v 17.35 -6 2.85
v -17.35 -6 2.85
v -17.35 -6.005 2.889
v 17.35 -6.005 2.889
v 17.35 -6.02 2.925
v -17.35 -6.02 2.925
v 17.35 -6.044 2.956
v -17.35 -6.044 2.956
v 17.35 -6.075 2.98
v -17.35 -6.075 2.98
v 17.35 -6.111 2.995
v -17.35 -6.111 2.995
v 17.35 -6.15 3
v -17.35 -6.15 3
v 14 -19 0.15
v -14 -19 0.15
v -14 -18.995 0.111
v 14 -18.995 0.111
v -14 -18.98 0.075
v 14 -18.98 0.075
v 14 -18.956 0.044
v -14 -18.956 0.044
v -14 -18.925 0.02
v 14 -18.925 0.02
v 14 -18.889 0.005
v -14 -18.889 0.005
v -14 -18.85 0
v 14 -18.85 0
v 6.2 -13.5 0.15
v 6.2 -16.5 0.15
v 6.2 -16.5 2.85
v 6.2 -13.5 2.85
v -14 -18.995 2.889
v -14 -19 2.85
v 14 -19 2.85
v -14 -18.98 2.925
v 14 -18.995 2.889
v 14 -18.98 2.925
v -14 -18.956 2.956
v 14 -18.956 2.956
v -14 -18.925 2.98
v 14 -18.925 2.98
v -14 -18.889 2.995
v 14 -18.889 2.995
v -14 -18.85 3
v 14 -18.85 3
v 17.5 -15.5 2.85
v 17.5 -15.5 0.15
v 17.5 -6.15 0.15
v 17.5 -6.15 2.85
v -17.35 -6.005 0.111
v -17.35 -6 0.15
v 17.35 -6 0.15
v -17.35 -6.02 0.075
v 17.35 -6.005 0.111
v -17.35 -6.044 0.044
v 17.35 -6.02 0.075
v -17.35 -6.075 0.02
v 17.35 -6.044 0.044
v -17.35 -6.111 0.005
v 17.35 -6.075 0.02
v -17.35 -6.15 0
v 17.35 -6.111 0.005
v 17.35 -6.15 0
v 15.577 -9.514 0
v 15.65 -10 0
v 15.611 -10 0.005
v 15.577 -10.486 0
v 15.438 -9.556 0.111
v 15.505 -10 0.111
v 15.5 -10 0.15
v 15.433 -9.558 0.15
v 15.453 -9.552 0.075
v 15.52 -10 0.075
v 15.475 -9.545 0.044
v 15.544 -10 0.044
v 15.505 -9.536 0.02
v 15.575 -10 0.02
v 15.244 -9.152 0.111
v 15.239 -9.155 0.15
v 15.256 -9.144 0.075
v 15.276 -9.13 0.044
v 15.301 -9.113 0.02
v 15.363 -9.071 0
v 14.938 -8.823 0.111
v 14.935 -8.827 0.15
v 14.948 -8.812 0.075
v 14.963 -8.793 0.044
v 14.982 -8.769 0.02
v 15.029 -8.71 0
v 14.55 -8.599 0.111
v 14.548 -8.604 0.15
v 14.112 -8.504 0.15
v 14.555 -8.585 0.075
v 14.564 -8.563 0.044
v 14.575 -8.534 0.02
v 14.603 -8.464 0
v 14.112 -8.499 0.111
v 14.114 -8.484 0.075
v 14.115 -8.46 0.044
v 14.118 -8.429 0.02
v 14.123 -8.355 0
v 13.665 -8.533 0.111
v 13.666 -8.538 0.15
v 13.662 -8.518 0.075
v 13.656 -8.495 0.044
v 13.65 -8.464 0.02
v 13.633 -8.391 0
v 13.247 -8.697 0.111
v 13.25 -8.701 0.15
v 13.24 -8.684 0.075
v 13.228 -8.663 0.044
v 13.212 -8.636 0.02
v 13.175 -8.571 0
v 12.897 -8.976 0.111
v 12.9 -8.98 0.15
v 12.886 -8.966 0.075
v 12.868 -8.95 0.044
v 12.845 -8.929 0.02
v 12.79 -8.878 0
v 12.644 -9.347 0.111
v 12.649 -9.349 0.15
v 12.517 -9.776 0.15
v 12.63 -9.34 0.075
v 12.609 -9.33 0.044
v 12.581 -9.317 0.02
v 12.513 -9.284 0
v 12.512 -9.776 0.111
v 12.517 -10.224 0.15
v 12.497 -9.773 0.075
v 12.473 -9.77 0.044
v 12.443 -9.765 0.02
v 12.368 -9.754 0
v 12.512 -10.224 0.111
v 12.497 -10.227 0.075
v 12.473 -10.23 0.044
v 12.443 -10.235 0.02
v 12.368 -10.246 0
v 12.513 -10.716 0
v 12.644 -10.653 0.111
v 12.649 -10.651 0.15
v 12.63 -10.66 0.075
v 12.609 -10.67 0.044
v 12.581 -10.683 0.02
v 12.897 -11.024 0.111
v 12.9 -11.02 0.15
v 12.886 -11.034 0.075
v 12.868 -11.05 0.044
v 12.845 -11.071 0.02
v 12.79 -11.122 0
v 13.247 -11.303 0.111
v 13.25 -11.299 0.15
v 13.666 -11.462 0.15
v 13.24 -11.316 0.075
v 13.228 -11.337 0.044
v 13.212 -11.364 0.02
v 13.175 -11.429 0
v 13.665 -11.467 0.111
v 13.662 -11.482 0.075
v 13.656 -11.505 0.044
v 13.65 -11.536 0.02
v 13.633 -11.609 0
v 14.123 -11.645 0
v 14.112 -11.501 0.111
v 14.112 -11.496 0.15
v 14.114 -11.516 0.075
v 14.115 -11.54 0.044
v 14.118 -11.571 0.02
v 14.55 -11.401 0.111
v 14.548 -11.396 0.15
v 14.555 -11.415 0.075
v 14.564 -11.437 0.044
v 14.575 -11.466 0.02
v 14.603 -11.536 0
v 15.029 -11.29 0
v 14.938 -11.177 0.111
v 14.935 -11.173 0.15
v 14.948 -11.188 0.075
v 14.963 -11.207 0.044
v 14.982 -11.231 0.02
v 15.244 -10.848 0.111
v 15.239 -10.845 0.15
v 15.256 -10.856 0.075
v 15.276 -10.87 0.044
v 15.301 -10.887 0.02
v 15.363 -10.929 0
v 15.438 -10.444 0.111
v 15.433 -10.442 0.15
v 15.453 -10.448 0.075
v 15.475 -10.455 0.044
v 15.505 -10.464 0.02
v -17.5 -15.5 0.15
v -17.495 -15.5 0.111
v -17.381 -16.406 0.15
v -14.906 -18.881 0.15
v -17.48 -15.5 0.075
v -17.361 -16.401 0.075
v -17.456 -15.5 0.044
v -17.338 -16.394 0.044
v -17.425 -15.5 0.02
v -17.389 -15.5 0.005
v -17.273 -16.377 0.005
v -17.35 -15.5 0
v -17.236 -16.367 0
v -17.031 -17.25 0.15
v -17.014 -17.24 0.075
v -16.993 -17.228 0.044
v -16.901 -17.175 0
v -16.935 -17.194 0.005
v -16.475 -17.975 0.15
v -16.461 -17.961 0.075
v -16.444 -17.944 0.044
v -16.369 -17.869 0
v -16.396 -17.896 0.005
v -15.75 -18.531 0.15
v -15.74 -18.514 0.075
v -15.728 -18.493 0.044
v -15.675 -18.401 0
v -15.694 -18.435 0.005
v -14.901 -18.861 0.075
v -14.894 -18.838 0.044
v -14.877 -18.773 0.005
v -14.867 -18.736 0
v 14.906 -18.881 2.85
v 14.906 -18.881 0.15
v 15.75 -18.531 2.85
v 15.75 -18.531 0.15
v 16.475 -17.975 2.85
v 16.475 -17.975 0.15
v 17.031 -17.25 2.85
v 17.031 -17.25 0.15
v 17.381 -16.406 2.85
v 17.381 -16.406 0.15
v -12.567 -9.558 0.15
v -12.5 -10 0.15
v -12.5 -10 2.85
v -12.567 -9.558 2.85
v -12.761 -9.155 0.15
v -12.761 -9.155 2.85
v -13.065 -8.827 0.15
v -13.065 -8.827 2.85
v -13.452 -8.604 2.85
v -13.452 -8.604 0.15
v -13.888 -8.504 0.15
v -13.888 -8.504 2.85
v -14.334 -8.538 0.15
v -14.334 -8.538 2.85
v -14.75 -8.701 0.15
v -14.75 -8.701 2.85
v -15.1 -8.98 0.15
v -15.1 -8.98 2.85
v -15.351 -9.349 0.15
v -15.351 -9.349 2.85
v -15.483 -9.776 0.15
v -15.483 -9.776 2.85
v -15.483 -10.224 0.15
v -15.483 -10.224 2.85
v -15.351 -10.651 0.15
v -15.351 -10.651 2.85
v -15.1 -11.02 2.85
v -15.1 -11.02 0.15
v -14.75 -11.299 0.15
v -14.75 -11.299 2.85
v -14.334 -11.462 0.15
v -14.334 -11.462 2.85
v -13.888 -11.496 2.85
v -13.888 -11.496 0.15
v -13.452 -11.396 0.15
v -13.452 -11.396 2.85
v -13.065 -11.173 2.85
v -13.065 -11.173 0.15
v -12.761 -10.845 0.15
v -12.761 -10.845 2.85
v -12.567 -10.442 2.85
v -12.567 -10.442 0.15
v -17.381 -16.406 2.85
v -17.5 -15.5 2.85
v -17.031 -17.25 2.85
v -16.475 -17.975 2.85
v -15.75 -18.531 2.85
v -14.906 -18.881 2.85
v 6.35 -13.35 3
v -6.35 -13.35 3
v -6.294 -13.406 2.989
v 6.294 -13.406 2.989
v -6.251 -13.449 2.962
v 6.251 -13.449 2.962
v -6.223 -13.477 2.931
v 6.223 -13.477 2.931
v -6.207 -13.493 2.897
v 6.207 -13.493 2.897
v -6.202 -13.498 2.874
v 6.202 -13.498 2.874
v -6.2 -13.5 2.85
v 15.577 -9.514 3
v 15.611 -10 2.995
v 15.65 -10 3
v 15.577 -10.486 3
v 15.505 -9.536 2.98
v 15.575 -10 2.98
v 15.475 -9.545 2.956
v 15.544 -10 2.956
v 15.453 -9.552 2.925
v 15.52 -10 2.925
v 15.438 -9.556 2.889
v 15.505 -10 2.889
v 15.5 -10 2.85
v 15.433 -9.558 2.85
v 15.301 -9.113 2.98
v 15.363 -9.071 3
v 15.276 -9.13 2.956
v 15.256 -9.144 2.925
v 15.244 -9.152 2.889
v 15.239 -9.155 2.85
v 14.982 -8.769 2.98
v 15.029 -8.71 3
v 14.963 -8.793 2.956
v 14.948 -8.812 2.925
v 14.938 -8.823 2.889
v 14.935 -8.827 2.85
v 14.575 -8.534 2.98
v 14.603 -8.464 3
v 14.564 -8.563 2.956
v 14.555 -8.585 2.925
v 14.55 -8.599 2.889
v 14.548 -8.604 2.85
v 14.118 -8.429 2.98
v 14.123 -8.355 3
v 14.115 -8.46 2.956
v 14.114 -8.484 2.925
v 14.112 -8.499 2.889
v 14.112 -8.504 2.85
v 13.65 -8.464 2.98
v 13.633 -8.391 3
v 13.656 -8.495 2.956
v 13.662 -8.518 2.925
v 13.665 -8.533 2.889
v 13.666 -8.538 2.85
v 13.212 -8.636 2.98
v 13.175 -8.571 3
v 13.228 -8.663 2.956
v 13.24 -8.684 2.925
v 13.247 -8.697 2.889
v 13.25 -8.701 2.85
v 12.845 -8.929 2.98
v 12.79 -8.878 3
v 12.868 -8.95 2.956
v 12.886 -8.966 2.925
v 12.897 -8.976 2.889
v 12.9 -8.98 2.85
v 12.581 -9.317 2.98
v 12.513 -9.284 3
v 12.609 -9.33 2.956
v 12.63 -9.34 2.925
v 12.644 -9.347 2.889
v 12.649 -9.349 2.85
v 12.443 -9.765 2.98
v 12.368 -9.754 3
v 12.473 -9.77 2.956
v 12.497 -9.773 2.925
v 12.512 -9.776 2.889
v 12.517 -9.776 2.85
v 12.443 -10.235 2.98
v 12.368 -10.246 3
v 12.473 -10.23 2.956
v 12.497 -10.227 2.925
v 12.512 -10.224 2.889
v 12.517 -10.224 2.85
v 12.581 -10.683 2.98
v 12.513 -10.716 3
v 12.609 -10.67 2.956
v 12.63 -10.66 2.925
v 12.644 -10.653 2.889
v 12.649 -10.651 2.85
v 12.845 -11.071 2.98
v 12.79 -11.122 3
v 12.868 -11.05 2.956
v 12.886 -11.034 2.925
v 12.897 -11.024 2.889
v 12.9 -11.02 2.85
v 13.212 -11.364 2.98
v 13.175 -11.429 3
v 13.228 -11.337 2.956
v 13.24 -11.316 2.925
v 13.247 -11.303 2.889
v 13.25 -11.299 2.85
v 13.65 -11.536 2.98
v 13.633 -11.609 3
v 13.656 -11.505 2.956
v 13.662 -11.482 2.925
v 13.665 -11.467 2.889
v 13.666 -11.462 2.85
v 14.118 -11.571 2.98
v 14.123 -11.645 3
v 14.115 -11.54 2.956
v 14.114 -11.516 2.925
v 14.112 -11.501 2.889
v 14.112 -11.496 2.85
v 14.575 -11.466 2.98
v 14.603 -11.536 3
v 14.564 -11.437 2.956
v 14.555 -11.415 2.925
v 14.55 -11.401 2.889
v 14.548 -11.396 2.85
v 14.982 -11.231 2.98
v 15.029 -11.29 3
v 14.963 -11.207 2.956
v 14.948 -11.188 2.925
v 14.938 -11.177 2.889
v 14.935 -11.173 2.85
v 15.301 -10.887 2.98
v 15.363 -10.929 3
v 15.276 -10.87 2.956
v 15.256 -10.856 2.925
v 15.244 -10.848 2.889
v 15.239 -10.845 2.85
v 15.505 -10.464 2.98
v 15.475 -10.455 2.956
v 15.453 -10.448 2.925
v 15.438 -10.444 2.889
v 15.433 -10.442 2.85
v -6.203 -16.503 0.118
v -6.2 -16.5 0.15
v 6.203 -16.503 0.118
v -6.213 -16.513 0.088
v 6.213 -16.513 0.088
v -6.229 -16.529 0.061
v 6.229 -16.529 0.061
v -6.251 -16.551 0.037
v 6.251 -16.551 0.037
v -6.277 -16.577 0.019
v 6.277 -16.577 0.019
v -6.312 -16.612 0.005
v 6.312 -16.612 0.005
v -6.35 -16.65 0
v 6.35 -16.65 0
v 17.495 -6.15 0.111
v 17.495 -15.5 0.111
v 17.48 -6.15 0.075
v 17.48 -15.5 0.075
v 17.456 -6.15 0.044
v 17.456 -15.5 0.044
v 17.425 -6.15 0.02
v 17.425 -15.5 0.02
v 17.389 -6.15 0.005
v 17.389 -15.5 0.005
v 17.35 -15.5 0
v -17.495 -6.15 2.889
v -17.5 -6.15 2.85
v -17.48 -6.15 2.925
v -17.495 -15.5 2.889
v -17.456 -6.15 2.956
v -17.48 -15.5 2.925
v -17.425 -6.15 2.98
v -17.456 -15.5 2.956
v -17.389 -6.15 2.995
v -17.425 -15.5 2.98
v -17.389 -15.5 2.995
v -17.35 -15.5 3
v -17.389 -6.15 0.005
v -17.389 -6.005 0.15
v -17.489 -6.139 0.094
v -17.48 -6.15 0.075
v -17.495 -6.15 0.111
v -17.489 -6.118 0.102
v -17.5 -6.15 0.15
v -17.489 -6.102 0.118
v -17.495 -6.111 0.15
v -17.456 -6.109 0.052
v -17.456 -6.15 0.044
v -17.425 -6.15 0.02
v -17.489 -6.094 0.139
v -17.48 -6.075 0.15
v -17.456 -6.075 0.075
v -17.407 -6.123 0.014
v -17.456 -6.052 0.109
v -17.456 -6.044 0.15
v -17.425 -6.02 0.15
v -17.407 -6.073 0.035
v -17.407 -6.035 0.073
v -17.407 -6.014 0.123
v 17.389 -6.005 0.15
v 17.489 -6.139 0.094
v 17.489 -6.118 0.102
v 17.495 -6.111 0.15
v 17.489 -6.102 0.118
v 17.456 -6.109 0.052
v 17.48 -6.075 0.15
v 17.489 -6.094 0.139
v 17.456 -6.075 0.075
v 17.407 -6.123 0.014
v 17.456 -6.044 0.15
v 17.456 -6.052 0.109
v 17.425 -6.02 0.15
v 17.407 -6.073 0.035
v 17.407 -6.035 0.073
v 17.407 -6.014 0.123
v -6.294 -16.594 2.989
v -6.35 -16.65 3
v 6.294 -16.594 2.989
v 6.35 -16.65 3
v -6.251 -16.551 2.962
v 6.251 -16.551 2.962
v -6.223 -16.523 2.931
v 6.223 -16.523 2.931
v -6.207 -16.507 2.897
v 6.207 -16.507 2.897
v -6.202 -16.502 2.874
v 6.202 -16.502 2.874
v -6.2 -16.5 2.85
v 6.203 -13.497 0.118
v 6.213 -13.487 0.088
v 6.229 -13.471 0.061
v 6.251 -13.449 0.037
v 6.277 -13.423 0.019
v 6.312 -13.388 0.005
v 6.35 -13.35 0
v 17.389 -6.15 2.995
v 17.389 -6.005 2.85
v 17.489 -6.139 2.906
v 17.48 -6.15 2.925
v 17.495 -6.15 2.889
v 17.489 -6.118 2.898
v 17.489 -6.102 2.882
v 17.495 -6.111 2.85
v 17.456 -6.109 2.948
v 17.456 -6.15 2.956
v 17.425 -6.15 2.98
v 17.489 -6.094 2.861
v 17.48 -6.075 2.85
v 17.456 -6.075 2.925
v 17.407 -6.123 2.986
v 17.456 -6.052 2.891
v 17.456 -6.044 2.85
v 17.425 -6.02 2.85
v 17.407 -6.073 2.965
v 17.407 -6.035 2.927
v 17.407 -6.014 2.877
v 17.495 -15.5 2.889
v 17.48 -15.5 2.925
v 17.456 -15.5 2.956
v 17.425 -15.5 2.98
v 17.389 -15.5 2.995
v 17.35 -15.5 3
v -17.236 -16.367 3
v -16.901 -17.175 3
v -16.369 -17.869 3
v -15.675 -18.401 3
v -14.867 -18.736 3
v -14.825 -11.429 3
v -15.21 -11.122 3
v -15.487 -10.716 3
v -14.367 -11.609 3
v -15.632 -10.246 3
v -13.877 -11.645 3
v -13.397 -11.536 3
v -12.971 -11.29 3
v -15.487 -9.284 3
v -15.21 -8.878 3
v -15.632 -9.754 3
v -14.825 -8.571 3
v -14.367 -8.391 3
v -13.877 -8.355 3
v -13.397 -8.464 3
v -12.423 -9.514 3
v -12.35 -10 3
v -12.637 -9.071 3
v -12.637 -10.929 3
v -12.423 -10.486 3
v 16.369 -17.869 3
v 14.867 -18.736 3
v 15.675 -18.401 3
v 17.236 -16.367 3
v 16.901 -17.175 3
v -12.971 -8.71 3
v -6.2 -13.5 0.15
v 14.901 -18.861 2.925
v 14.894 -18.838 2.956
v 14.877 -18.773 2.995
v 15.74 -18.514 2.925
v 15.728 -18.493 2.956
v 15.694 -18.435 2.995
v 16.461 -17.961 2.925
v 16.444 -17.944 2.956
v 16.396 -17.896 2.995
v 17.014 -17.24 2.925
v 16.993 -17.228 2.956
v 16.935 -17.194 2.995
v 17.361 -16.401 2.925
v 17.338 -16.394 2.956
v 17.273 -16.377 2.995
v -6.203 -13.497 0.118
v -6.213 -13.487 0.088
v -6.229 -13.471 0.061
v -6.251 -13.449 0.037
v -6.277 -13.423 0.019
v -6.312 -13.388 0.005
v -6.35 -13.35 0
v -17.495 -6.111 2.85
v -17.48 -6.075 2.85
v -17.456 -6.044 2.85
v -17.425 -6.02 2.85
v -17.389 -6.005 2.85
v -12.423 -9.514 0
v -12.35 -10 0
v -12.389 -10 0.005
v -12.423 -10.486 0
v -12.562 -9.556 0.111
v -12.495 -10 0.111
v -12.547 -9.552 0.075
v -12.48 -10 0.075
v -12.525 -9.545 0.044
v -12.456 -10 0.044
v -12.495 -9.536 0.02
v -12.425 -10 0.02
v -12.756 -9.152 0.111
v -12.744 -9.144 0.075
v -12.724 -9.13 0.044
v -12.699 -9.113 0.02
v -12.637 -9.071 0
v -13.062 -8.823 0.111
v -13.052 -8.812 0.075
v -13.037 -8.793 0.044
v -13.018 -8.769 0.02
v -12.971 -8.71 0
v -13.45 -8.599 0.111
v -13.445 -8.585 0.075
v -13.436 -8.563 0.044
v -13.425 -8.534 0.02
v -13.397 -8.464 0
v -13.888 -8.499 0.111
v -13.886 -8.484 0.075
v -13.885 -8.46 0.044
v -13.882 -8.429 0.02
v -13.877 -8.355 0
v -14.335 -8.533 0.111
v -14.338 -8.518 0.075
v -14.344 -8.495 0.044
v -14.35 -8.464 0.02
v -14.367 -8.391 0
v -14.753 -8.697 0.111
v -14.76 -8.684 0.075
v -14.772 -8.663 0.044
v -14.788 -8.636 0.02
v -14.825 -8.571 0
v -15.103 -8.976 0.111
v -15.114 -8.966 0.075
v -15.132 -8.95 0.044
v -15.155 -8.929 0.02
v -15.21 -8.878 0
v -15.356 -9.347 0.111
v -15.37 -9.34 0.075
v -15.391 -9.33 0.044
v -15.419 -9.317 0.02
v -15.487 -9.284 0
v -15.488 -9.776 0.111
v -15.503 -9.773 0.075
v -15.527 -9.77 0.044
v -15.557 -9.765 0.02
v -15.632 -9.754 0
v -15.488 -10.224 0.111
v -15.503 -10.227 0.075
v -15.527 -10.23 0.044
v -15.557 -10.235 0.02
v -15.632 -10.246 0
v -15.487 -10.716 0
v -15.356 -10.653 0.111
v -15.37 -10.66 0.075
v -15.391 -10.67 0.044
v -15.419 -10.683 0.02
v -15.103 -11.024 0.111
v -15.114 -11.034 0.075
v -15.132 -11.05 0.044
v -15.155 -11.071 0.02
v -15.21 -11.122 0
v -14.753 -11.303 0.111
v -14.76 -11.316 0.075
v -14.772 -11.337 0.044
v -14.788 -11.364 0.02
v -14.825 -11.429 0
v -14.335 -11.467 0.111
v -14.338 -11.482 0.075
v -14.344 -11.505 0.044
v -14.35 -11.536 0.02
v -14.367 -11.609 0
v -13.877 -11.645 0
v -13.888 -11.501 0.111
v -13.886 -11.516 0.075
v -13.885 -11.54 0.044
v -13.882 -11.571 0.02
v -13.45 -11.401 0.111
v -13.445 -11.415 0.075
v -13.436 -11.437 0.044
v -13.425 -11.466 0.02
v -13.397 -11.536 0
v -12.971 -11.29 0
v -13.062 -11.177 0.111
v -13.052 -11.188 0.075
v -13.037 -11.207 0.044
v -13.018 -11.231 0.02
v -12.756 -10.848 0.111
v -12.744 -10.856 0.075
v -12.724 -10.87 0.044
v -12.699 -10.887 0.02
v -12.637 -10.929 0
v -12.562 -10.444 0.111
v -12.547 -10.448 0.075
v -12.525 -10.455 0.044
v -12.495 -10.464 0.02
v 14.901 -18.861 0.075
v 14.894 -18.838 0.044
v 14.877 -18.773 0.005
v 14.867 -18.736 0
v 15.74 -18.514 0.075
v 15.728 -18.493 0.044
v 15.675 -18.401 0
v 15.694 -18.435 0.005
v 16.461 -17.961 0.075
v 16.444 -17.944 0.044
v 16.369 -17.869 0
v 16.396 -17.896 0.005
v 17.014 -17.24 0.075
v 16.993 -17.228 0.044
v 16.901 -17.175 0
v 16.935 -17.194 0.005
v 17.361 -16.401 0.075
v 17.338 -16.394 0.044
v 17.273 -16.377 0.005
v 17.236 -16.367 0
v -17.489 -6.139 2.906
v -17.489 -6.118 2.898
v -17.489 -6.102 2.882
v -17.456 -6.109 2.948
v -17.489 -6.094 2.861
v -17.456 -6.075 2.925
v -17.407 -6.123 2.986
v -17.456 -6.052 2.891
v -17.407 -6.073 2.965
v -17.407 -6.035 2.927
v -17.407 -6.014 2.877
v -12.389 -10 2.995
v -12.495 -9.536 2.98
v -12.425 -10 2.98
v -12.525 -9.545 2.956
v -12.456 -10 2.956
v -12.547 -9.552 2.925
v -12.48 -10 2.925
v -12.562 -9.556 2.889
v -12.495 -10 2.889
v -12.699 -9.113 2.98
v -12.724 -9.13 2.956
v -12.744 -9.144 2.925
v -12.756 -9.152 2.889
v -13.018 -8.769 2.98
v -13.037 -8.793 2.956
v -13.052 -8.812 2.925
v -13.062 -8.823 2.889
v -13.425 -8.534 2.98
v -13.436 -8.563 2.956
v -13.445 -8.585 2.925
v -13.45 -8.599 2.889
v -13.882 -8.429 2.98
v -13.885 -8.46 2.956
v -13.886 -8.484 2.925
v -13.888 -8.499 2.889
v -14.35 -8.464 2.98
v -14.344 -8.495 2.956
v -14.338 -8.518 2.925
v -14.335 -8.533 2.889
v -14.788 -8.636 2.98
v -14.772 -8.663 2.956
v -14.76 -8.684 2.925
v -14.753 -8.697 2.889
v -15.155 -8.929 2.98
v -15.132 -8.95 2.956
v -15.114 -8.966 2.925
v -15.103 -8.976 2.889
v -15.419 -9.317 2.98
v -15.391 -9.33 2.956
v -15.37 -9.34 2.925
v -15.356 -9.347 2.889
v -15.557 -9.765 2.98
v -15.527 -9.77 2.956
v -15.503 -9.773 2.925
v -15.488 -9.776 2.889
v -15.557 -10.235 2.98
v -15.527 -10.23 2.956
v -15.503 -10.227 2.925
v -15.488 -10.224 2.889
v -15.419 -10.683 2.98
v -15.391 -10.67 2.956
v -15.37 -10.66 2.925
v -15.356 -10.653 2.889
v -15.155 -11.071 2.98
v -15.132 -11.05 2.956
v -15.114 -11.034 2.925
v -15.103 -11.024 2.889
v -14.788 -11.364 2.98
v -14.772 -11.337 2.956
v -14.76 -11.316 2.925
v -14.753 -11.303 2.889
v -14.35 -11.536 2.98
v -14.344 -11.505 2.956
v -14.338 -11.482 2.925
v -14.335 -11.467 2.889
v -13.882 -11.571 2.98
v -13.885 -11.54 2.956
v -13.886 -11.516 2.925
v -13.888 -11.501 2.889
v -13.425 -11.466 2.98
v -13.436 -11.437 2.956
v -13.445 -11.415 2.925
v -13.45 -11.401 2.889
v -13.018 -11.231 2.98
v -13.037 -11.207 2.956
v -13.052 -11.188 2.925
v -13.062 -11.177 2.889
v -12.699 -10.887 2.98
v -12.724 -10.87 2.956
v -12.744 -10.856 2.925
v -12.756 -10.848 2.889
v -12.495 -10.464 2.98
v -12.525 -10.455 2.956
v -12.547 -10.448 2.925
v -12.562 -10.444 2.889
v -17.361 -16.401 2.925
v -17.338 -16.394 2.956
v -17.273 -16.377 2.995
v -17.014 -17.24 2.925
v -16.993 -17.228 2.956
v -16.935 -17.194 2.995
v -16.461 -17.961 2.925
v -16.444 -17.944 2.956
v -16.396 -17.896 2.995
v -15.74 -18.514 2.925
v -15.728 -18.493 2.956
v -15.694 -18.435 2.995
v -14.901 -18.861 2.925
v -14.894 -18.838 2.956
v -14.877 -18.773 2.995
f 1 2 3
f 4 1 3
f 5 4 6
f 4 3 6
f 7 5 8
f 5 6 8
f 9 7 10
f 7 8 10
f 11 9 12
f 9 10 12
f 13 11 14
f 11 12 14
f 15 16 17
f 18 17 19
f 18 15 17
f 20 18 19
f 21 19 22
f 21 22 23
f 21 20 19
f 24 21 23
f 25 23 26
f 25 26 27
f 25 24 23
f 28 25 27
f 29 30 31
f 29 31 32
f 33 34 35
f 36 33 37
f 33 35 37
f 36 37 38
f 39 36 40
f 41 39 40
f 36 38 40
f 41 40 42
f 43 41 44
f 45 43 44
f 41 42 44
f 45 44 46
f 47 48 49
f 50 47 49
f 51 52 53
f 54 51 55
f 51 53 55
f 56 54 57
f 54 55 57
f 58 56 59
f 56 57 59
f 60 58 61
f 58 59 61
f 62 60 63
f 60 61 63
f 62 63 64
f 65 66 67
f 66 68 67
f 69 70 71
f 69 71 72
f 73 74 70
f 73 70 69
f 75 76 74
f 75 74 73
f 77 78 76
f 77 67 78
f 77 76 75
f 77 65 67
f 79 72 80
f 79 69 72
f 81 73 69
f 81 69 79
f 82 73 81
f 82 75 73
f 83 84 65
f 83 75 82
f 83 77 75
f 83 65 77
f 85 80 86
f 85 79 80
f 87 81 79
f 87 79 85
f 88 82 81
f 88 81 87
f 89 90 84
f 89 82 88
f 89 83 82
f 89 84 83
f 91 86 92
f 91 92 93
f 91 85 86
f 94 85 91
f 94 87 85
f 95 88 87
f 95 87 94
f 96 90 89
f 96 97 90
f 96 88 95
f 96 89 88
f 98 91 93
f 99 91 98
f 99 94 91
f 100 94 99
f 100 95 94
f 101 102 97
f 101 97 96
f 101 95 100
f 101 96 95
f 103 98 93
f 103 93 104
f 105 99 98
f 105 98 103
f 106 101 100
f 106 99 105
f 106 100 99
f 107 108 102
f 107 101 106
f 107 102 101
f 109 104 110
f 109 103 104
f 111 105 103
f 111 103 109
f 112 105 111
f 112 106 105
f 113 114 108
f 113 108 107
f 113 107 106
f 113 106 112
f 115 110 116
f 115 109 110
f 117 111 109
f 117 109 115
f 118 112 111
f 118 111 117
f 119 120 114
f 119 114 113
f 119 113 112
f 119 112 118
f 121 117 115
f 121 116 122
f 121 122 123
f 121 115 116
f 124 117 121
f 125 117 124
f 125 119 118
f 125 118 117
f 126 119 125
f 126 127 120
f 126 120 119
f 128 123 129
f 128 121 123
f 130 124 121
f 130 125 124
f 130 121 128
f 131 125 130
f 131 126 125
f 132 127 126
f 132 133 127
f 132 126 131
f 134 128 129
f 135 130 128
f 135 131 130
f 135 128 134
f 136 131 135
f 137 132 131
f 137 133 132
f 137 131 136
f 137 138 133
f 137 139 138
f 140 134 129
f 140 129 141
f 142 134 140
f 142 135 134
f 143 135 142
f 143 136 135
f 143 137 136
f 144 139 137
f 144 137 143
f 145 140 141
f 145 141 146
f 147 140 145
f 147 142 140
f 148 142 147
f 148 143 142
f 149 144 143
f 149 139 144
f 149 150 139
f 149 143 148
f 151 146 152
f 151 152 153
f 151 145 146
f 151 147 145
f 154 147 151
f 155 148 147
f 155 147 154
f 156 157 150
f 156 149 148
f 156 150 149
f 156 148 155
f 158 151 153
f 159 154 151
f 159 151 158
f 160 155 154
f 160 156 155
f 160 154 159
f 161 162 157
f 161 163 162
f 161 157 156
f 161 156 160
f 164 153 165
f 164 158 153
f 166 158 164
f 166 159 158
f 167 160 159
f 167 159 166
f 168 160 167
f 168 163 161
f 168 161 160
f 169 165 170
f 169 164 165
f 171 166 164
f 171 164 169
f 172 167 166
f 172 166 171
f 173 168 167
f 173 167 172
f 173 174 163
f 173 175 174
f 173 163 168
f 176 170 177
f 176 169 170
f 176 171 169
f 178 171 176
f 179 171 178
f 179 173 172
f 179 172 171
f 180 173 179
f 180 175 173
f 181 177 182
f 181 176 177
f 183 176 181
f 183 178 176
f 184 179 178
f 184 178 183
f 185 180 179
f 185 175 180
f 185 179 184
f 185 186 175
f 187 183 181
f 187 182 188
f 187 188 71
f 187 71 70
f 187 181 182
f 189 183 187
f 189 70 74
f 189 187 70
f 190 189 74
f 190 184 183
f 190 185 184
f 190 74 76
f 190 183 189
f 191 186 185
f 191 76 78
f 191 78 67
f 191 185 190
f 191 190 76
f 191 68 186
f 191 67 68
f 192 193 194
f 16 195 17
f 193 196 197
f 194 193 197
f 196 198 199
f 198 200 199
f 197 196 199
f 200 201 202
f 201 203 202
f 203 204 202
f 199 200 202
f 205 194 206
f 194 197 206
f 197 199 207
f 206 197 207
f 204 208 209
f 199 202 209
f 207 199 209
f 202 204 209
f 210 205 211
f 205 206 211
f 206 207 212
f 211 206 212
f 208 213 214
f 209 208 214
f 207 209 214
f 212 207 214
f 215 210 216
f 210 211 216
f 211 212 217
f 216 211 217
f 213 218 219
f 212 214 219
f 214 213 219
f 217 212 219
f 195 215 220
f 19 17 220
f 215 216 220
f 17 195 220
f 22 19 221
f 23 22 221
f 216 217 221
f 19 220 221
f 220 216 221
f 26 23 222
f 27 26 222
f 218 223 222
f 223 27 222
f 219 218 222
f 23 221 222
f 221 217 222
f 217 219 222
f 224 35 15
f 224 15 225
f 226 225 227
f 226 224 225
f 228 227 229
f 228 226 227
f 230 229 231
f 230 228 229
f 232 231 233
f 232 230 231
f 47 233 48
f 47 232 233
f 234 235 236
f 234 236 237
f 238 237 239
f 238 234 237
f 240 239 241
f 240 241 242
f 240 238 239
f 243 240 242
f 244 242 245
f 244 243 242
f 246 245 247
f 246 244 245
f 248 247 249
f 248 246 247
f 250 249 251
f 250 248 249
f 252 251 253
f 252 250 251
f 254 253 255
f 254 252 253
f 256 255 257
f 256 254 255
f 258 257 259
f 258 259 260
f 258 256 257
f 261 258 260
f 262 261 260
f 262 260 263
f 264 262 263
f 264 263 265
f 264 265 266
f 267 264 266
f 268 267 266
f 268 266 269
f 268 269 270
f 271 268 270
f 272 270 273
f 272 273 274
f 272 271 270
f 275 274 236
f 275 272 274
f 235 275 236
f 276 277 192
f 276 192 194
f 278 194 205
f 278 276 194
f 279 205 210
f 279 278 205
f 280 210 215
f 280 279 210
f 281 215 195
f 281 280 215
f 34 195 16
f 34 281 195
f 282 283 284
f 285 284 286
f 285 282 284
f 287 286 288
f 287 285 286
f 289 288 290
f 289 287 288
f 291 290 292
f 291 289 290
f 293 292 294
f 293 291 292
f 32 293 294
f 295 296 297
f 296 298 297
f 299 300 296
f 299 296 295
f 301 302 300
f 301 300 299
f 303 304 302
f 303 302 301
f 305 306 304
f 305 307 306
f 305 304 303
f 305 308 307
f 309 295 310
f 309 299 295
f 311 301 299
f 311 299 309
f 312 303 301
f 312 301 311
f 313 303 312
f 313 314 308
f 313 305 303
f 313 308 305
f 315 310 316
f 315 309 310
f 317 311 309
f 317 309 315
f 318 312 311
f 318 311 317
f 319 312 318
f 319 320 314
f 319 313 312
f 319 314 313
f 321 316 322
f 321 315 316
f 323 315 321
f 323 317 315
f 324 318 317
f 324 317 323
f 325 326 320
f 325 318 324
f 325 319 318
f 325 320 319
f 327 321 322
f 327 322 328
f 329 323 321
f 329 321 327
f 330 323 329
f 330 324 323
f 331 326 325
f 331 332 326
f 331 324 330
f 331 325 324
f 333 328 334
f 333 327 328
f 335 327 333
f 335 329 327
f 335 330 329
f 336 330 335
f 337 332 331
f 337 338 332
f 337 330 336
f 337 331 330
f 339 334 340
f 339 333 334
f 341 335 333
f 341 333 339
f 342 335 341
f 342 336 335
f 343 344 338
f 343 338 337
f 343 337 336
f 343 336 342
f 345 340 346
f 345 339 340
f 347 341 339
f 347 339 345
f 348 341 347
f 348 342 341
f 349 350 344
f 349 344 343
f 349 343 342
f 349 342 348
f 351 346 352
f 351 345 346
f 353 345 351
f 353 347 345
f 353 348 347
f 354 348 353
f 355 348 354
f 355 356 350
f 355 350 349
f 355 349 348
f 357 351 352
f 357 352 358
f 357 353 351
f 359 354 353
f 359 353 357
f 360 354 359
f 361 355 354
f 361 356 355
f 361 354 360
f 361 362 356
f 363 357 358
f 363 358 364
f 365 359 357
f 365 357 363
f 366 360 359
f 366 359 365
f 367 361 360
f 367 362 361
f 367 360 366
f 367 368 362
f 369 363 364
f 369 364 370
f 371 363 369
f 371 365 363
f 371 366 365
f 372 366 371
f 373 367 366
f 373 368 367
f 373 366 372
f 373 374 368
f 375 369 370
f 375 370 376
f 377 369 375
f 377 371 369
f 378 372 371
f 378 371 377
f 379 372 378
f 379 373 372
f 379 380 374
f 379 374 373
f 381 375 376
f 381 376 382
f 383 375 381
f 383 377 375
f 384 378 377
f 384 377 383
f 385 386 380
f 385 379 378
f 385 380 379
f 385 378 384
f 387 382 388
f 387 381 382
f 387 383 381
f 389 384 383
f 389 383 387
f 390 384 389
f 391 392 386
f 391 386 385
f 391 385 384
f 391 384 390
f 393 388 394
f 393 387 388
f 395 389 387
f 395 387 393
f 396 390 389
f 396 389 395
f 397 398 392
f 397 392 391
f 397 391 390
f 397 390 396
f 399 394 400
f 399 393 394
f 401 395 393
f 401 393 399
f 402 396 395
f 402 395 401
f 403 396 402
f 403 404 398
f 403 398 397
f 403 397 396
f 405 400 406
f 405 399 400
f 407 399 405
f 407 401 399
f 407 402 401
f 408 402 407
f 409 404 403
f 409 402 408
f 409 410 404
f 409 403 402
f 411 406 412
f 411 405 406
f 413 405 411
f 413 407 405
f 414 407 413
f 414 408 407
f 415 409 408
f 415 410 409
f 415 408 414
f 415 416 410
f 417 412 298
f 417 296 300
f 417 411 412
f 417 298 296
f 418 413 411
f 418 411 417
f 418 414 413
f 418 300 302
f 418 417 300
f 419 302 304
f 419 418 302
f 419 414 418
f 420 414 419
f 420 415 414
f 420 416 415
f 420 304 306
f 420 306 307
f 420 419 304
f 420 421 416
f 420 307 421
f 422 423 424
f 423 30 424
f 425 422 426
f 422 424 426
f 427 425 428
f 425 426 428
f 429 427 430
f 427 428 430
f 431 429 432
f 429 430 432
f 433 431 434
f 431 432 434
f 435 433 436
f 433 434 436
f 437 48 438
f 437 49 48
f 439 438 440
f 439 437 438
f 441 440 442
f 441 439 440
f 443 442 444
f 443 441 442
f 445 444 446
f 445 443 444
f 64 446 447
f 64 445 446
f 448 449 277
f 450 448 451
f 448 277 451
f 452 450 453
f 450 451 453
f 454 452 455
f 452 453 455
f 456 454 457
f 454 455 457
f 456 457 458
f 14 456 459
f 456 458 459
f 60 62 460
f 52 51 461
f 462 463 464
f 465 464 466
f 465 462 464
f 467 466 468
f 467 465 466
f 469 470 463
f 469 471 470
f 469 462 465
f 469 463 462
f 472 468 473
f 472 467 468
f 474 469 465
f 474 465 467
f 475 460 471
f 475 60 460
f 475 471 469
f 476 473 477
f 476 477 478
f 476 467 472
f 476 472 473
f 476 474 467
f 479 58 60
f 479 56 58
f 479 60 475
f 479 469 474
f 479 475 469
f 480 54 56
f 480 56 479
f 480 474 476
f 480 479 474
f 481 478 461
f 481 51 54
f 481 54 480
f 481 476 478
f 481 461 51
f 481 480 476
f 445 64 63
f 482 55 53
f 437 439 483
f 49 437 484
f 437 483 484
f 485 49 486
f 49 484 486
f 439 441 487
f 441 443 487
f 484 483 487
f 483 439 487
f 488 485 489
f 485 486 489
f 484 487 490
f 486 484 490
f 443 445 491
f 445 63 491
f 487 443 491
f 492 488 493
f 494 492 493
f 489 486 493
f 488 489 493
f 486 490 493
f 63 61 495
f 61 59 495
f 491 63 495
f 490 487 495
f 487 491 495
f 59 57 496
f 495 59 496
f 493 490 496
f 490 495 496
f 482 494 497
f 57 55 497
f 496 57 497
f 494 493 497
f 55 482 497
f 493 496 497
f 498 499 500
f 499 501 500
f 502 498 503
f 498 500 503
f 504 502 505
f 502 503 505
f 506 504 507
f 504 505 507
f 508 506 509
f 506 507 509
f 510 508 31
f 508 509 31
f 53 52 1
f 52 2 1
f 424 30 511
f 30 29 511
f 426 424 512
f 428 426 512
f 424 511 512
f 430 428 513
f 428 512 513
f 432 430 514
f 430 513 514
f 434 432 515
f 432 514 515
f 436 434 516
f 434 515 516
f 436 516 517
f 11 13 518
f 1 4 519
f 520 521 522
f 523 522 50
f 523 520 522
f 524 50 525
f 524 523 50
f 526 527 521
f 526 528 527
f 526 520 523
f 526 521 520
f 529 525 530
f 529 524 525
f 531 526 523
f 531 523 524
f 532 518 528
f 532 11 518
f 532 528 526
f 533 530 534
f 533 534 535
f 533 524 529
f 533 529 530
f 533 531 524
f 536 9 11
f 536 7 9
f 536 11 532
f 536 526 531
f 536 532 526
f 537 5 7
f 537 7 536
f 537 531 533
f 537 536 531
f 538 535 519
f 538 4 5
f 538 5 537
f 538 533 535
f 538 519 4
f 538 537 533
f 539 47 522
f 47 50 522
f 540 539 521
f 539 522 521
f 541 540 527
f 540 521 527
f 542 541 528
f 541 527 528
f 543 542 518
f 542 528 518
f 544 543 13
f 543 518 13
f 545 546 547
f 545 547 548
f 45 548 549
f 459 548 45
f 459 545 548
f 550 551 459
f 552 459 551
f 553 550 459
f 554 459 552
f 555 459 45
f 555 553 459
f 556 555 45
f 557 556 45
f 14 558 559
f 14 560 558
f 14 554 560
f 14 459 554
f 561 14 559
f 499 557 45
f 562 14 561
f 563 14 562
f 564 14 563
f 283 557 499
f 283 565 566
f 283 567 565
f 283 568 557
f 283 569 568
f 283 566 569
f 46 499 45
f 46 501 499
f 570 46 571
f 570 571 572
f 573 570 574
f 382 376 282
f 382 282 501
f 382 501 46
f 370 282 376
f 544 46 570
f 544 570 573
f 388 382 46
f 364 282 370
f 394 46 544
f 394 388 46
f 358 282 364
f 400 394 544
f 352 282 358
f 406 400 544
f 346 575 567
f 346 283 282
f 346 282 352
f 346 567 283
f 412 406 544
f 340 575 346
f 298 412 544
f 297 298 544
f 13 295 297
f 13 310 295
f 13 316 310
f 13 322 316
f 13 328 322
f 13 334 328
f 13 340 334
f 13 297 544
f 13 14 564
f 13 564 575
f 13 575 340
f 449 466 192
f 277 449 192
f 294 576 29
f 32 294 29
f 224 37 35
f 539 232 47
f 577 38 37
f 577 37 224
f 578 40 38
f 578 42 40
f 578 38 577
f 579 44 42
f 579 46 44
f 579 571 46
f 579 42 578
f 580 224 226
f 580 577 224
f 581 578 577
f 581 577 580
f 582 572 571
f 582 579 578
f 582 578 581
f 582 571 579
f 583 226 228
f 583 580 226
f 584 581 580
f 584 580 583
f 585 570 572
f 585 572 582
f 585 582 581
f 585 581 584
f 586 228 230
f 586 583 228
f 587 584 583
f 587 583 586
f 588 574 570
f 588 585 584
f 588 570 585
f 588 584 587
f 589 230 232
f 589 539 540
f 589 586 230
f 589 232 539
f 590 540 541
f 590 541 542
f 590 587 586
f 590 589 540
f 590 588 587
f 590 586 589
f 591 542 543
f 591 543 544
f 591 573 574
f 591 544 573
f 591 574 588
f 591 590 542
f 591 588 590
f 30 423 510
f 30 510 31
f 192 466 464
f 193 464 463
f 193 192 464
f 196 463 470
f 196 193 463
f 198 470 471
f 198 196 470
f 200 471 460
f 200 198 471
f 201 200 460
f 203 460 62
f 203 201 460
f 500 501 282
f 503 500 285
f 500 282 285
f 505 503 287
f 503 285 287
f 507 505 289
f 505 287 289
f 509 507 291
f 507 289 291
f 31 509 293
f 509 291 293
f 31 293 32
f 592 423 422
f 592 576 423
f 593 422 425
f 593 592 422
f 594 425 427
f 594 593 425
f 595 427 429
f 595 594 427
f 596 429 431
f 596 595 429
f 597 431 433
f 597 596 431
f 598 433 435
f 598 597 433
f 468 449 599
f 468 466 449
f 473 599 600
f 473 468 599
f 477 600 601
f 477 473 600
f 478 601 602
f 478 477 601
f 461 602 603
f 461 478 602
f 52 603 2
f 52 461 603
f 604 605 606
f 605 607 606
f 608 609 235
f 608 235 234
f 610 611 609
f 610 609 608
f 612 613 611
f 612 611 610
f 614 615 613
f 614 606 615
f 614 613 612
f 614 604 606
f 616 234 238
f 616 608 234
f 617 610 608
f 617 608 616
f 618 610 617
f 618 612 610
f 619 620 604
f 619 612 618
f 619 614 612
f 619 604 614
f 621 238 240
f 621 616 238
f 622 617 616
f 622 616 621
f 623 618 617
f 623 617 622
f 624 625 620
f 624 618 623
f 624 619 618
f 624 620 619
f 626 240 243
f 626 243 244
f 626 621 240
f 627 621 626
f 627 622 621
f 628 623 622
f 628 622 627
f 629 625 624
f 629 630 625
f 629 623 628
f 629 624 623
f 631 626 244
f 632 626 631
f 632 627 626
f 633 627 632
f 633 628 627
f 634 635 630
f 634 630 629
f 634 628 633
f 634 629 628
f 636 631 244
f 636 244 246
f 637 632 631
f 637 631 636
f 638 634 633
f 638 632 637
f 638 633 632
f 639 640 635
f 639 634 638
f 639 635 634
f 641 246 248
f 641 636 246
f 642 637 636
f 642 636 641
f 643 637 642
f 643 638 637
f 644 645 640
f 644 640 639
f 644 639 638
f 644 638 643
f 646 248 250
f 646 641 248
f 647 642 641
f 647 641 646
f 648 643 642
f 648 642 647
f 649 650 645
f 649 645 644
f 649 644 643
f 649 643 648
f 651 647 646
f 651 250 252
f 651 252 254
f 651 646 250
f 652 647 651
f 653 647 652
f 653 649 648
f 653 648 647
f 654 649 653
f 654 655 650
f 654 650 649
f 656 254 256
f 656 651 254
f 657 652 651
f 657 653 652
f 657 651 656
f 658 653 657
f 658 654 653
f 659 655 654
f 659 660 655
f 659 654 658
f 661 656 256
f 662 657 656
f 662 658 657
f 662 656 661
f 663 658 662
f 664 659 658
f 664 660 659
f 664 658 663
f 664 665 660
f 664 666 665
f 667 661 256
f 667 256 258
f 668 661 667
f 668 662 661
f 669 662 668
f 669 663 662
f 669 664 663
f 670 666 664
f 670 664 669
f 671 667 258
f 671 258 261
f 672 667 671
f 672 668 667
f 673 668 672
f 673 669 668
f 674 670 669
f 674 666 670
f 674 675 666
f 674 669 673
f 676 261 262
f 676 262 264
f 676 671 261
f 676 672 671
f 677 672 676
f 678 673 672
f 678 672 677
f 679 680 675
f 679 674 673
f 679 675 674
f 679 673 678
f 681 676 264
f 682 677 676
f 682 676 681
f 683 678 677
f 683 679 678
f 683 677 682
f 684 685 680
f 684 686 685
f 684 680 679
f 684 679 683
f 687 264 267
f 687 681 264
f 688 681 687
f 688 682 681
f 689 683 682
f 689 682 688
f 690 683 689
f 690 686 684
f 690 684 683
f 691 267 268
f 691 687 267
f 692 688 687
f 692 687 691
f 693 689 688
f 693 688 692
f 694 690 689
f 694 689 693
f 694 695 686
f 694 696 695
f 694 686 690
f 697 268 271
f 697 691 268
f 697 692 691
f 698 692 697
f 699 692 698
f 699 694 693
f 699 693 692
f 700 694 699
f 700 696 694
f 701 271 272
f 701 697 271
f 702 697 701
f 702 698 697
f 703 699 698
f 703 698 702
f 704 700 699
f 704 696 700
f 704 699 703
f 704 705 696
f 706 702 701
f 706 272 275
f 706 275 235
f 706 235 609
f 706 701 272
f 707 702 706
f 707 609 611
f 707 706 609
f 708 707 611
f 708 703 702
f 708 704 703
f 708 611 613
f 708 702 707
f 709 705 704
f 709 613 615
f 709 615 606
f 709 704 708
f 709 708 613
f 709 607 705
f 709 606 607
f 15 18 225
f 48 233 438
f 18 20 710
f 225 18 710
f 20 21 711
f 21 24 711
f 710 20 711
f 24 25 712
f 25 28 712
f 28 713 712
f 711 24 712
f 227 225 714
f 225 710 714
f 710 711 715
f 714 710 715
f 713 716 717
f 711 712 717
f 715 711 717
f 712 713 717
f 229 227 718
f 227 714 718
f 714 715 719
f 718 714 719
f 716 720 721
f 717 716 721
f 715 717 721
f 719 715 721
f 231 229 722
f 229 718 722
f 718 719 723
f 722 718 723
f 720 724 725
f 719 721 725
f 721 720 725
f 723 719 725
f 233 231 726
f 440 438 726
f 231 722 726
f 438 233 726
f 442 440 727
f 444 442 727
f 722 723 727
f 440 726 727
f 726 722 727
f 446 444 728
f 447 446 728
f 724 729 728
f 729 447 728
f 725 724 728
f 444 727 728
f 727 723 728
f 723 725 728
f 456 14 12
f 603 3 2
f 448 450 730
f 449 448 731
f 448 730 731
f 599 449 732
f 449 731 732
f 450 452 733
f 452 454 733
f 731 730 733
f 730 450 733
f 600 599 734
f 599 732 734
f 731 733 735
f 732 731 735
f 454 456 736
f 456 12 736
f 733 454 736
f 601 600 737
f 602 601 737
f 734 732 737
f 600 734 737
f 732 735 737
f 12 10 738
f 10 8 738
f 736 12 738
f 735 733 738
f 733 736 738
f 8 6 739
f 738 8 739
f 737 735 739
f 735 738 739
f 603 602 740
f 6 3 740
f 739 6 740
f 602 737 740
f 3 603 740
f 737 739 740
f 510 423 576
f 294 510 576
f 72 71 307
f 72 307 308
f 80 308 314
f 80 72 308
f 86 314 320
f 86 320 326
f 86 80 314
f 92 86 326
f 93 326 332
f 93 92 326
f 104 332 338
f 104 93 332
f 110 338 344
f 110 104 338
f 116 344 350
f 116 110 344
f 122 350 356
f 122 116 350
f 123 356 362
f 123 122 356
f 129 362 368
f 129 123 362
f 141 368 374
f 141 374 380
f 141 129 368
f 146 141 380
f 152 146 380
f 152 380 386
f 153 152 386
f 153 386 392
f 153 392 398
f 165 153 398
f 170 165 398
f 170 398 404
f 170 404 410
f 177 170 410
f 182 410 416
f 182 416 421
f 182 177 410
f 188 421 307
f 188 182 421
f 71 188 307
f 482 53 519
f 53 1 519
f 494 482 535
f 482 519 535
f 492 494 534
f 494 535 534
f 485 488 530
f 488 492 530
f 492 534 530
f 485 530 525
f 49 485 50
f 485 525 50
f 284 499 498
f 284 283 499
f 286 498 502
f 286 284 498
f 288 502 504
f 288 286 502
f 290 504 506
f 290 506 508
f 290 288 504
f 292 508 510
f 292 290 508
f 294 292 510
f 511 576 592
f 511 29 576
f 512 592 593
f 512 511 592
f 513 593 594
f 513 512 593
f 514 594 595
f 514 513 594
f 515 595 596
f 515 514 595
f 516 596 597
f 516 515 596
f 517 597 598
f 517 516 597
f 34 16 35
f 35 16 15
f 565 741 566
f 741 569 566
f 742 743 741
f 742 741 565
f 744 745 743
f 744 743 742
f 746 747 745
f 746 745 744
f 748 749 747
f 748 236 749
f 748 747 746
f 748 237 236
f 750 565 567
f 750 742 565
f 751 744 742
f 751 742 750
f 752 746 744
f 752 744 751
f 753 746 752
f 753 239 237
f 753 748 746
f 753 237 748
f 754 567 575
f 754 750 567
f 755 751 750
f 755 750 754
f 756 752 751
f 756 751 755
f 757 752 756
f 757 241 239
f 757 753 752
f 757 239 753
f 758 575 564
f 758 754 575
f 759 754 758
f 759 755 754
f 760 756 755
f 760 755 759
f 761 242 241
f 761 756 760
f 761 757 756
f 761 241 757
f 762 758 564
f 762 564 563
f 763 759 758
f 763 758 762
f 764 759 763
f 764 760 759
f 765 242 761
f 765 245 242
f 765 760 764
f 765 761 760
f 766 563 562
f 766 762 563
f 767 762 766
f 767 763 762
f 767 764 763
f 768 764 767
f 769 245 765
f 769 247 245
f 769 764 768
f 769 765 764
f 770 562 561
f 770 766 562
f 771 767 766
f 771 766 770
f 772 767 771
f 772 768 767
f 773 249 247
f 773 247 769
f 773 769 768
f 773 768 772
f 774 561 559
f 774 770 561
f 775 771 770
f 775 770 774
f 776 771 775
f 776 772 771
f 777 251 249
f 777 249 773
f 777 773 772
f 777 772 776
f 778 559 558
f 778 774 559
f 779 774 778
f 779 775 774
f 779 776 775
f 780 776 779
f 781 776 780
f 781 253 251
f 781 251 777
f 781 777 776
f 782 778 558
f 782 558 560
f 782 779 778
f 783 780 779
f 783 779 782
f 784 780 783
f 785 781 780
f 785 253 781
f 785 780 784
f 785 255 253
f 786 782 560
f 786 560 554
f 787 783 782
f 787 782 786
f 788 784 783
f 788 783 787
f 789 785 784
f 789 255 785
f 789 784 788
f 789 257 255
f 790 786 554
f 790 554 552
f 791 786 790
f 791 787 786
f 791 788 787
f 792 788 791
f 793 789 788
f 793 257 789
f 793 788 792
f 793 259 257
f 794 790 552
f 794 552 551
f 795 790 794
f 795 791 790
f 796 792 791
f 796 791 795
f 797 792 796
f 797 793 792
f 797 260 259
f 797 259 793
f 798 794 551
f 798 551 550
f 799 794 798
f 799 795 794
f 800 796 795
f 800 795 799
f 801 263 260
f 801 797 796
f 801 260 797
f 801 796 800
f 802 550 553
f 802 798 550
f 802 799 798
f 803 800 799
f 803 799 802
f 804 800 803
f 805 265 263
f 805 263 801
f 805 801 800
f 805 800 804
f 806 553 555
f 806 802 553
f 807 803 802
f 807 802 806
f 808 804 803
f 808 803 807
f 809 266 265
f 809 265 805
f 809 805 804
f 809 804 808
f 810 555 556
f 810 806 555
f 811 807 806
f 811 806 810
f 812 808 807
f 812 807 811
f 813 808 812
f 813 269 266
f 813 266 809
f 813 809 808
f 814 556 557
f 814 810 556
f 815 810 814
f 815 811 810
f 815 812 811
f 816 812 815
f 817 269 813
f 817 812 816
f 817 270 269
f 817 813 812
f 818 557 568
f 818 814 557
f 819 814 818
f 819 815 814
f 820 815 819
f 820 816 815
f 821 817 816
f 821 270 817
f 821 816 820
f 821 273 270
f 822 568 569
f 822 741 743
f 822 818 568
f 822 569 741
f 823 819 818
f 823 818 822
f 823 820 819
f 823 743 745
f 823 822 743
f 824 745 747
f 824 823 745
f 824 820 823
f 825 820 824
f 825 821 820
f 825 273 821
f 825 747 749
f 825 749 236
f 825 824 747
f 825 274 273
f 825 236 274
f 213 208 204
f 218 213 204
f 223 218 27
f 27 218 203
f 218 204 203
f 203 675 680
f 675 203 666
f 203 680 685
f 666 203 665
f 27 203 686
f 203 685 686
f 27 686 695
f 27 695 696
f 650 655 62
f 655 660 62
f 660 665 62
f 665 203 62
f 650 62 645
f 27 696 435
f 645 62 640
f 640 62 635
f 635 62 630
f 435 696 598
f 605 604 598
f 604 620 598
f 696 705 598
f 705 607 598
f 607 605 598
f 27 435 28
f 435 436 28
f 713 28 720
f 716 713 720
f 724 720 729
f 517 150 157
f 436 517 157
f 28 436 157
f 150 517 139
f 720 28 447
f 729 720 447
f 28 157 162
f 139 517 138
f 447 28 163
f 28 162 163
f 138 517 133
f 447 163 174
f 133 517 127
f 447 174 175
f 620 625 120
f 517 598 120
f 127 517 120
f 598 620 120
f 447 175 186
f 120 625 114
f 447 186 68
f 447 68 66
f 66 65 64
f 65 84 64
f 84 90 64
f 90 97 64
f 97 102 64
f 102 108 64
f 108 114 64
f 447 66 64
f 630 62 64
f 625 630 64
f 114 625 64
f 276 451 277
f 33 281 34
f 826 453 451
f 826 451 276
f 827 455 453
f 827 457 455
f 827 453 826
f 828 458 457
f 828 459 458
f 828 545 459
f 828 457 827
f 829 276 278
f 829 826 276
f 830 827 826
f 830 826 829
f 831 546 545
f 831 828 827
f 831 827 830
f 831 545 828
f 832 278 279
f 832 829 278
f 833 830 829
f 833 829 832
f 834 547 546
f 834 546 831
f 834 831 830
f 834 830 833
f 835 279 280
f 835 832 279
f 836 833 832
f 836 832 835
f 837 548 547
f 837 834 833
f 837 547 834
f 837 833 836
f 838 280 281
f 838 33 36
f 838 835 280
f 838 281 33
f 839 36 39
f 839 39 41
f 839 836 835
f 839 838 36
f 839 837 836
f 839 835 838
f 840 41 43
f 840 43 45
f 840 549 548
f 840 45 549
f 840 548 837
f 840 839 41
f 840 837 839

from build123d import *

# Parameters (mm, degrees)
SKETCH1_R               = 1
SKETCH1_R_2             = 1.5
SKETCH1_R_3             = 2
SKETCH1_W               = 23
SKETCH1_H               = 12
SKETCH1_W_2             = 12.4
SKETCH1_H_2             = 3
BOSS_EXTRUDE1_DEPTH     = 3
FILLET1_R               = 3.5
CUT_EXTRUDE1_DEPTH      = 1
CUT_EXTRUDE1_DEPTH_BACK = 4
FILLET3_R               = 0.15


with BuildPart() as part:
    # Sketch1 → Boss-Extrude1 (new body)
    with BuildSketch(Plane.XY):
        with BuildLine():
            Line((-17.5, 9), (-17.5, -19))
            Line((-17.5, -19), (17.5, -19))
            Line((17.5, -19), (17.5, 9))
            ThreePointArc((17.5, 9), (0, 26), (-17.5, 9))
        make_face()
        with Locations((-14, 0)):
            Circle(SKETCH1_R, mode=Mode.SUBTRACT)
        with Locations((-14, -10)):
            Circle(SKETCH1_R_2, mode=Mode.SUBTRACT)
        with Locations((-8.5, 16)):
            Circle(SKETCH1_R_3, mode=Mode.SUBTRACT)
        with Locations((14, -10)):
            Circle(SKETCH1_R_2, mode=Mode.SUBTRACT)
        with Locations((14, 0)):
            Circle(SKETCH1_R, mode=Mode.SUBTRACT)
        with Locations((8.5, 16)):
            Circle(SKETCH1_R_3, mode=Mode.SUBTRACT)
        Rectangle(SKETCH1_W, SKETCH1_H, mode=Mode.SUBTRACT)
        with Locations((0, -15)):
            Rectangle(SKETCH1_W_2, SKETCH1_H_2, mode=Mode.SUBTRACT)
    extrude(amount=BOSS_EXTRUDE1_DEPTH)

    # Fillet1
    fillet1_edges = [part.edges().sort_by_distance(p)[0] for p in [
        (17.5, -19, 1.5),
        (-17.5, -19, 1.5),
    ]]
    fillet(fillet1_edges, radius=FILLET1_R)

    # Sketch2 → Cut-Extrude1 (cut, two sides)
    with BuildSketch(Plane.XY.offset(3)) as cut_extrude1_sk:
        Polygon((-142.935501538, -6), (-22.5, -6), (27.5, -6), (147.935501538, -6), (147.935501538, 234.871003076), (-142.935501538, 234.871003076), align=None)
    extrude(amount=CUT_EXTRUDE1_DEPTH, mode=Mode.SUBTRACT)
    extrude(cut_extrude1_sk.sketch, amount=-CUT_EXTRUDE1_DEPTH_BACK, mode=Mode.SUBTRACT)

    # Fillet3
    fillet3_edges = [part.edges().sort_by_distance(p)[0] for p in [
        (0, -6, 0),
        (0, -6, 3),
        (-15.5, -10, 0),
        (-15.5, -10, 3),
        (-6.2, -15, 0),
        (0, -16.5, 0),
        (6.2, -15, 0),
        (0, -13.5, 0),
        (-6.2, -15, 3),
        (0, -16.5, 3),
        (6.2, -15, 3),
        (0, -13.5, 3),
        (12.5, -10, 0),
        (12.5, -10, 3),
        (17.5, -10.75, 0),
        (17.5, -10.75, 3),
        (0, -19, 0),
        (-16.474873734, -17.974873734, 0),
        (16.474873734, -17.974873734, 0),
        (0, -19, 3),
        (-16.474873734, -17.974873734, 3),
        (16.474873734, -17.974873734, 3),
        (-17.5, -10.75, 0),
        (-17.5, -10.75, 3),
        (-17.5, -6, 1.5),
        (17.5, -6, 1.5),
    ]]
    fillet(fillet3_edges, radius=FILLET3_R)


solid = part.part
